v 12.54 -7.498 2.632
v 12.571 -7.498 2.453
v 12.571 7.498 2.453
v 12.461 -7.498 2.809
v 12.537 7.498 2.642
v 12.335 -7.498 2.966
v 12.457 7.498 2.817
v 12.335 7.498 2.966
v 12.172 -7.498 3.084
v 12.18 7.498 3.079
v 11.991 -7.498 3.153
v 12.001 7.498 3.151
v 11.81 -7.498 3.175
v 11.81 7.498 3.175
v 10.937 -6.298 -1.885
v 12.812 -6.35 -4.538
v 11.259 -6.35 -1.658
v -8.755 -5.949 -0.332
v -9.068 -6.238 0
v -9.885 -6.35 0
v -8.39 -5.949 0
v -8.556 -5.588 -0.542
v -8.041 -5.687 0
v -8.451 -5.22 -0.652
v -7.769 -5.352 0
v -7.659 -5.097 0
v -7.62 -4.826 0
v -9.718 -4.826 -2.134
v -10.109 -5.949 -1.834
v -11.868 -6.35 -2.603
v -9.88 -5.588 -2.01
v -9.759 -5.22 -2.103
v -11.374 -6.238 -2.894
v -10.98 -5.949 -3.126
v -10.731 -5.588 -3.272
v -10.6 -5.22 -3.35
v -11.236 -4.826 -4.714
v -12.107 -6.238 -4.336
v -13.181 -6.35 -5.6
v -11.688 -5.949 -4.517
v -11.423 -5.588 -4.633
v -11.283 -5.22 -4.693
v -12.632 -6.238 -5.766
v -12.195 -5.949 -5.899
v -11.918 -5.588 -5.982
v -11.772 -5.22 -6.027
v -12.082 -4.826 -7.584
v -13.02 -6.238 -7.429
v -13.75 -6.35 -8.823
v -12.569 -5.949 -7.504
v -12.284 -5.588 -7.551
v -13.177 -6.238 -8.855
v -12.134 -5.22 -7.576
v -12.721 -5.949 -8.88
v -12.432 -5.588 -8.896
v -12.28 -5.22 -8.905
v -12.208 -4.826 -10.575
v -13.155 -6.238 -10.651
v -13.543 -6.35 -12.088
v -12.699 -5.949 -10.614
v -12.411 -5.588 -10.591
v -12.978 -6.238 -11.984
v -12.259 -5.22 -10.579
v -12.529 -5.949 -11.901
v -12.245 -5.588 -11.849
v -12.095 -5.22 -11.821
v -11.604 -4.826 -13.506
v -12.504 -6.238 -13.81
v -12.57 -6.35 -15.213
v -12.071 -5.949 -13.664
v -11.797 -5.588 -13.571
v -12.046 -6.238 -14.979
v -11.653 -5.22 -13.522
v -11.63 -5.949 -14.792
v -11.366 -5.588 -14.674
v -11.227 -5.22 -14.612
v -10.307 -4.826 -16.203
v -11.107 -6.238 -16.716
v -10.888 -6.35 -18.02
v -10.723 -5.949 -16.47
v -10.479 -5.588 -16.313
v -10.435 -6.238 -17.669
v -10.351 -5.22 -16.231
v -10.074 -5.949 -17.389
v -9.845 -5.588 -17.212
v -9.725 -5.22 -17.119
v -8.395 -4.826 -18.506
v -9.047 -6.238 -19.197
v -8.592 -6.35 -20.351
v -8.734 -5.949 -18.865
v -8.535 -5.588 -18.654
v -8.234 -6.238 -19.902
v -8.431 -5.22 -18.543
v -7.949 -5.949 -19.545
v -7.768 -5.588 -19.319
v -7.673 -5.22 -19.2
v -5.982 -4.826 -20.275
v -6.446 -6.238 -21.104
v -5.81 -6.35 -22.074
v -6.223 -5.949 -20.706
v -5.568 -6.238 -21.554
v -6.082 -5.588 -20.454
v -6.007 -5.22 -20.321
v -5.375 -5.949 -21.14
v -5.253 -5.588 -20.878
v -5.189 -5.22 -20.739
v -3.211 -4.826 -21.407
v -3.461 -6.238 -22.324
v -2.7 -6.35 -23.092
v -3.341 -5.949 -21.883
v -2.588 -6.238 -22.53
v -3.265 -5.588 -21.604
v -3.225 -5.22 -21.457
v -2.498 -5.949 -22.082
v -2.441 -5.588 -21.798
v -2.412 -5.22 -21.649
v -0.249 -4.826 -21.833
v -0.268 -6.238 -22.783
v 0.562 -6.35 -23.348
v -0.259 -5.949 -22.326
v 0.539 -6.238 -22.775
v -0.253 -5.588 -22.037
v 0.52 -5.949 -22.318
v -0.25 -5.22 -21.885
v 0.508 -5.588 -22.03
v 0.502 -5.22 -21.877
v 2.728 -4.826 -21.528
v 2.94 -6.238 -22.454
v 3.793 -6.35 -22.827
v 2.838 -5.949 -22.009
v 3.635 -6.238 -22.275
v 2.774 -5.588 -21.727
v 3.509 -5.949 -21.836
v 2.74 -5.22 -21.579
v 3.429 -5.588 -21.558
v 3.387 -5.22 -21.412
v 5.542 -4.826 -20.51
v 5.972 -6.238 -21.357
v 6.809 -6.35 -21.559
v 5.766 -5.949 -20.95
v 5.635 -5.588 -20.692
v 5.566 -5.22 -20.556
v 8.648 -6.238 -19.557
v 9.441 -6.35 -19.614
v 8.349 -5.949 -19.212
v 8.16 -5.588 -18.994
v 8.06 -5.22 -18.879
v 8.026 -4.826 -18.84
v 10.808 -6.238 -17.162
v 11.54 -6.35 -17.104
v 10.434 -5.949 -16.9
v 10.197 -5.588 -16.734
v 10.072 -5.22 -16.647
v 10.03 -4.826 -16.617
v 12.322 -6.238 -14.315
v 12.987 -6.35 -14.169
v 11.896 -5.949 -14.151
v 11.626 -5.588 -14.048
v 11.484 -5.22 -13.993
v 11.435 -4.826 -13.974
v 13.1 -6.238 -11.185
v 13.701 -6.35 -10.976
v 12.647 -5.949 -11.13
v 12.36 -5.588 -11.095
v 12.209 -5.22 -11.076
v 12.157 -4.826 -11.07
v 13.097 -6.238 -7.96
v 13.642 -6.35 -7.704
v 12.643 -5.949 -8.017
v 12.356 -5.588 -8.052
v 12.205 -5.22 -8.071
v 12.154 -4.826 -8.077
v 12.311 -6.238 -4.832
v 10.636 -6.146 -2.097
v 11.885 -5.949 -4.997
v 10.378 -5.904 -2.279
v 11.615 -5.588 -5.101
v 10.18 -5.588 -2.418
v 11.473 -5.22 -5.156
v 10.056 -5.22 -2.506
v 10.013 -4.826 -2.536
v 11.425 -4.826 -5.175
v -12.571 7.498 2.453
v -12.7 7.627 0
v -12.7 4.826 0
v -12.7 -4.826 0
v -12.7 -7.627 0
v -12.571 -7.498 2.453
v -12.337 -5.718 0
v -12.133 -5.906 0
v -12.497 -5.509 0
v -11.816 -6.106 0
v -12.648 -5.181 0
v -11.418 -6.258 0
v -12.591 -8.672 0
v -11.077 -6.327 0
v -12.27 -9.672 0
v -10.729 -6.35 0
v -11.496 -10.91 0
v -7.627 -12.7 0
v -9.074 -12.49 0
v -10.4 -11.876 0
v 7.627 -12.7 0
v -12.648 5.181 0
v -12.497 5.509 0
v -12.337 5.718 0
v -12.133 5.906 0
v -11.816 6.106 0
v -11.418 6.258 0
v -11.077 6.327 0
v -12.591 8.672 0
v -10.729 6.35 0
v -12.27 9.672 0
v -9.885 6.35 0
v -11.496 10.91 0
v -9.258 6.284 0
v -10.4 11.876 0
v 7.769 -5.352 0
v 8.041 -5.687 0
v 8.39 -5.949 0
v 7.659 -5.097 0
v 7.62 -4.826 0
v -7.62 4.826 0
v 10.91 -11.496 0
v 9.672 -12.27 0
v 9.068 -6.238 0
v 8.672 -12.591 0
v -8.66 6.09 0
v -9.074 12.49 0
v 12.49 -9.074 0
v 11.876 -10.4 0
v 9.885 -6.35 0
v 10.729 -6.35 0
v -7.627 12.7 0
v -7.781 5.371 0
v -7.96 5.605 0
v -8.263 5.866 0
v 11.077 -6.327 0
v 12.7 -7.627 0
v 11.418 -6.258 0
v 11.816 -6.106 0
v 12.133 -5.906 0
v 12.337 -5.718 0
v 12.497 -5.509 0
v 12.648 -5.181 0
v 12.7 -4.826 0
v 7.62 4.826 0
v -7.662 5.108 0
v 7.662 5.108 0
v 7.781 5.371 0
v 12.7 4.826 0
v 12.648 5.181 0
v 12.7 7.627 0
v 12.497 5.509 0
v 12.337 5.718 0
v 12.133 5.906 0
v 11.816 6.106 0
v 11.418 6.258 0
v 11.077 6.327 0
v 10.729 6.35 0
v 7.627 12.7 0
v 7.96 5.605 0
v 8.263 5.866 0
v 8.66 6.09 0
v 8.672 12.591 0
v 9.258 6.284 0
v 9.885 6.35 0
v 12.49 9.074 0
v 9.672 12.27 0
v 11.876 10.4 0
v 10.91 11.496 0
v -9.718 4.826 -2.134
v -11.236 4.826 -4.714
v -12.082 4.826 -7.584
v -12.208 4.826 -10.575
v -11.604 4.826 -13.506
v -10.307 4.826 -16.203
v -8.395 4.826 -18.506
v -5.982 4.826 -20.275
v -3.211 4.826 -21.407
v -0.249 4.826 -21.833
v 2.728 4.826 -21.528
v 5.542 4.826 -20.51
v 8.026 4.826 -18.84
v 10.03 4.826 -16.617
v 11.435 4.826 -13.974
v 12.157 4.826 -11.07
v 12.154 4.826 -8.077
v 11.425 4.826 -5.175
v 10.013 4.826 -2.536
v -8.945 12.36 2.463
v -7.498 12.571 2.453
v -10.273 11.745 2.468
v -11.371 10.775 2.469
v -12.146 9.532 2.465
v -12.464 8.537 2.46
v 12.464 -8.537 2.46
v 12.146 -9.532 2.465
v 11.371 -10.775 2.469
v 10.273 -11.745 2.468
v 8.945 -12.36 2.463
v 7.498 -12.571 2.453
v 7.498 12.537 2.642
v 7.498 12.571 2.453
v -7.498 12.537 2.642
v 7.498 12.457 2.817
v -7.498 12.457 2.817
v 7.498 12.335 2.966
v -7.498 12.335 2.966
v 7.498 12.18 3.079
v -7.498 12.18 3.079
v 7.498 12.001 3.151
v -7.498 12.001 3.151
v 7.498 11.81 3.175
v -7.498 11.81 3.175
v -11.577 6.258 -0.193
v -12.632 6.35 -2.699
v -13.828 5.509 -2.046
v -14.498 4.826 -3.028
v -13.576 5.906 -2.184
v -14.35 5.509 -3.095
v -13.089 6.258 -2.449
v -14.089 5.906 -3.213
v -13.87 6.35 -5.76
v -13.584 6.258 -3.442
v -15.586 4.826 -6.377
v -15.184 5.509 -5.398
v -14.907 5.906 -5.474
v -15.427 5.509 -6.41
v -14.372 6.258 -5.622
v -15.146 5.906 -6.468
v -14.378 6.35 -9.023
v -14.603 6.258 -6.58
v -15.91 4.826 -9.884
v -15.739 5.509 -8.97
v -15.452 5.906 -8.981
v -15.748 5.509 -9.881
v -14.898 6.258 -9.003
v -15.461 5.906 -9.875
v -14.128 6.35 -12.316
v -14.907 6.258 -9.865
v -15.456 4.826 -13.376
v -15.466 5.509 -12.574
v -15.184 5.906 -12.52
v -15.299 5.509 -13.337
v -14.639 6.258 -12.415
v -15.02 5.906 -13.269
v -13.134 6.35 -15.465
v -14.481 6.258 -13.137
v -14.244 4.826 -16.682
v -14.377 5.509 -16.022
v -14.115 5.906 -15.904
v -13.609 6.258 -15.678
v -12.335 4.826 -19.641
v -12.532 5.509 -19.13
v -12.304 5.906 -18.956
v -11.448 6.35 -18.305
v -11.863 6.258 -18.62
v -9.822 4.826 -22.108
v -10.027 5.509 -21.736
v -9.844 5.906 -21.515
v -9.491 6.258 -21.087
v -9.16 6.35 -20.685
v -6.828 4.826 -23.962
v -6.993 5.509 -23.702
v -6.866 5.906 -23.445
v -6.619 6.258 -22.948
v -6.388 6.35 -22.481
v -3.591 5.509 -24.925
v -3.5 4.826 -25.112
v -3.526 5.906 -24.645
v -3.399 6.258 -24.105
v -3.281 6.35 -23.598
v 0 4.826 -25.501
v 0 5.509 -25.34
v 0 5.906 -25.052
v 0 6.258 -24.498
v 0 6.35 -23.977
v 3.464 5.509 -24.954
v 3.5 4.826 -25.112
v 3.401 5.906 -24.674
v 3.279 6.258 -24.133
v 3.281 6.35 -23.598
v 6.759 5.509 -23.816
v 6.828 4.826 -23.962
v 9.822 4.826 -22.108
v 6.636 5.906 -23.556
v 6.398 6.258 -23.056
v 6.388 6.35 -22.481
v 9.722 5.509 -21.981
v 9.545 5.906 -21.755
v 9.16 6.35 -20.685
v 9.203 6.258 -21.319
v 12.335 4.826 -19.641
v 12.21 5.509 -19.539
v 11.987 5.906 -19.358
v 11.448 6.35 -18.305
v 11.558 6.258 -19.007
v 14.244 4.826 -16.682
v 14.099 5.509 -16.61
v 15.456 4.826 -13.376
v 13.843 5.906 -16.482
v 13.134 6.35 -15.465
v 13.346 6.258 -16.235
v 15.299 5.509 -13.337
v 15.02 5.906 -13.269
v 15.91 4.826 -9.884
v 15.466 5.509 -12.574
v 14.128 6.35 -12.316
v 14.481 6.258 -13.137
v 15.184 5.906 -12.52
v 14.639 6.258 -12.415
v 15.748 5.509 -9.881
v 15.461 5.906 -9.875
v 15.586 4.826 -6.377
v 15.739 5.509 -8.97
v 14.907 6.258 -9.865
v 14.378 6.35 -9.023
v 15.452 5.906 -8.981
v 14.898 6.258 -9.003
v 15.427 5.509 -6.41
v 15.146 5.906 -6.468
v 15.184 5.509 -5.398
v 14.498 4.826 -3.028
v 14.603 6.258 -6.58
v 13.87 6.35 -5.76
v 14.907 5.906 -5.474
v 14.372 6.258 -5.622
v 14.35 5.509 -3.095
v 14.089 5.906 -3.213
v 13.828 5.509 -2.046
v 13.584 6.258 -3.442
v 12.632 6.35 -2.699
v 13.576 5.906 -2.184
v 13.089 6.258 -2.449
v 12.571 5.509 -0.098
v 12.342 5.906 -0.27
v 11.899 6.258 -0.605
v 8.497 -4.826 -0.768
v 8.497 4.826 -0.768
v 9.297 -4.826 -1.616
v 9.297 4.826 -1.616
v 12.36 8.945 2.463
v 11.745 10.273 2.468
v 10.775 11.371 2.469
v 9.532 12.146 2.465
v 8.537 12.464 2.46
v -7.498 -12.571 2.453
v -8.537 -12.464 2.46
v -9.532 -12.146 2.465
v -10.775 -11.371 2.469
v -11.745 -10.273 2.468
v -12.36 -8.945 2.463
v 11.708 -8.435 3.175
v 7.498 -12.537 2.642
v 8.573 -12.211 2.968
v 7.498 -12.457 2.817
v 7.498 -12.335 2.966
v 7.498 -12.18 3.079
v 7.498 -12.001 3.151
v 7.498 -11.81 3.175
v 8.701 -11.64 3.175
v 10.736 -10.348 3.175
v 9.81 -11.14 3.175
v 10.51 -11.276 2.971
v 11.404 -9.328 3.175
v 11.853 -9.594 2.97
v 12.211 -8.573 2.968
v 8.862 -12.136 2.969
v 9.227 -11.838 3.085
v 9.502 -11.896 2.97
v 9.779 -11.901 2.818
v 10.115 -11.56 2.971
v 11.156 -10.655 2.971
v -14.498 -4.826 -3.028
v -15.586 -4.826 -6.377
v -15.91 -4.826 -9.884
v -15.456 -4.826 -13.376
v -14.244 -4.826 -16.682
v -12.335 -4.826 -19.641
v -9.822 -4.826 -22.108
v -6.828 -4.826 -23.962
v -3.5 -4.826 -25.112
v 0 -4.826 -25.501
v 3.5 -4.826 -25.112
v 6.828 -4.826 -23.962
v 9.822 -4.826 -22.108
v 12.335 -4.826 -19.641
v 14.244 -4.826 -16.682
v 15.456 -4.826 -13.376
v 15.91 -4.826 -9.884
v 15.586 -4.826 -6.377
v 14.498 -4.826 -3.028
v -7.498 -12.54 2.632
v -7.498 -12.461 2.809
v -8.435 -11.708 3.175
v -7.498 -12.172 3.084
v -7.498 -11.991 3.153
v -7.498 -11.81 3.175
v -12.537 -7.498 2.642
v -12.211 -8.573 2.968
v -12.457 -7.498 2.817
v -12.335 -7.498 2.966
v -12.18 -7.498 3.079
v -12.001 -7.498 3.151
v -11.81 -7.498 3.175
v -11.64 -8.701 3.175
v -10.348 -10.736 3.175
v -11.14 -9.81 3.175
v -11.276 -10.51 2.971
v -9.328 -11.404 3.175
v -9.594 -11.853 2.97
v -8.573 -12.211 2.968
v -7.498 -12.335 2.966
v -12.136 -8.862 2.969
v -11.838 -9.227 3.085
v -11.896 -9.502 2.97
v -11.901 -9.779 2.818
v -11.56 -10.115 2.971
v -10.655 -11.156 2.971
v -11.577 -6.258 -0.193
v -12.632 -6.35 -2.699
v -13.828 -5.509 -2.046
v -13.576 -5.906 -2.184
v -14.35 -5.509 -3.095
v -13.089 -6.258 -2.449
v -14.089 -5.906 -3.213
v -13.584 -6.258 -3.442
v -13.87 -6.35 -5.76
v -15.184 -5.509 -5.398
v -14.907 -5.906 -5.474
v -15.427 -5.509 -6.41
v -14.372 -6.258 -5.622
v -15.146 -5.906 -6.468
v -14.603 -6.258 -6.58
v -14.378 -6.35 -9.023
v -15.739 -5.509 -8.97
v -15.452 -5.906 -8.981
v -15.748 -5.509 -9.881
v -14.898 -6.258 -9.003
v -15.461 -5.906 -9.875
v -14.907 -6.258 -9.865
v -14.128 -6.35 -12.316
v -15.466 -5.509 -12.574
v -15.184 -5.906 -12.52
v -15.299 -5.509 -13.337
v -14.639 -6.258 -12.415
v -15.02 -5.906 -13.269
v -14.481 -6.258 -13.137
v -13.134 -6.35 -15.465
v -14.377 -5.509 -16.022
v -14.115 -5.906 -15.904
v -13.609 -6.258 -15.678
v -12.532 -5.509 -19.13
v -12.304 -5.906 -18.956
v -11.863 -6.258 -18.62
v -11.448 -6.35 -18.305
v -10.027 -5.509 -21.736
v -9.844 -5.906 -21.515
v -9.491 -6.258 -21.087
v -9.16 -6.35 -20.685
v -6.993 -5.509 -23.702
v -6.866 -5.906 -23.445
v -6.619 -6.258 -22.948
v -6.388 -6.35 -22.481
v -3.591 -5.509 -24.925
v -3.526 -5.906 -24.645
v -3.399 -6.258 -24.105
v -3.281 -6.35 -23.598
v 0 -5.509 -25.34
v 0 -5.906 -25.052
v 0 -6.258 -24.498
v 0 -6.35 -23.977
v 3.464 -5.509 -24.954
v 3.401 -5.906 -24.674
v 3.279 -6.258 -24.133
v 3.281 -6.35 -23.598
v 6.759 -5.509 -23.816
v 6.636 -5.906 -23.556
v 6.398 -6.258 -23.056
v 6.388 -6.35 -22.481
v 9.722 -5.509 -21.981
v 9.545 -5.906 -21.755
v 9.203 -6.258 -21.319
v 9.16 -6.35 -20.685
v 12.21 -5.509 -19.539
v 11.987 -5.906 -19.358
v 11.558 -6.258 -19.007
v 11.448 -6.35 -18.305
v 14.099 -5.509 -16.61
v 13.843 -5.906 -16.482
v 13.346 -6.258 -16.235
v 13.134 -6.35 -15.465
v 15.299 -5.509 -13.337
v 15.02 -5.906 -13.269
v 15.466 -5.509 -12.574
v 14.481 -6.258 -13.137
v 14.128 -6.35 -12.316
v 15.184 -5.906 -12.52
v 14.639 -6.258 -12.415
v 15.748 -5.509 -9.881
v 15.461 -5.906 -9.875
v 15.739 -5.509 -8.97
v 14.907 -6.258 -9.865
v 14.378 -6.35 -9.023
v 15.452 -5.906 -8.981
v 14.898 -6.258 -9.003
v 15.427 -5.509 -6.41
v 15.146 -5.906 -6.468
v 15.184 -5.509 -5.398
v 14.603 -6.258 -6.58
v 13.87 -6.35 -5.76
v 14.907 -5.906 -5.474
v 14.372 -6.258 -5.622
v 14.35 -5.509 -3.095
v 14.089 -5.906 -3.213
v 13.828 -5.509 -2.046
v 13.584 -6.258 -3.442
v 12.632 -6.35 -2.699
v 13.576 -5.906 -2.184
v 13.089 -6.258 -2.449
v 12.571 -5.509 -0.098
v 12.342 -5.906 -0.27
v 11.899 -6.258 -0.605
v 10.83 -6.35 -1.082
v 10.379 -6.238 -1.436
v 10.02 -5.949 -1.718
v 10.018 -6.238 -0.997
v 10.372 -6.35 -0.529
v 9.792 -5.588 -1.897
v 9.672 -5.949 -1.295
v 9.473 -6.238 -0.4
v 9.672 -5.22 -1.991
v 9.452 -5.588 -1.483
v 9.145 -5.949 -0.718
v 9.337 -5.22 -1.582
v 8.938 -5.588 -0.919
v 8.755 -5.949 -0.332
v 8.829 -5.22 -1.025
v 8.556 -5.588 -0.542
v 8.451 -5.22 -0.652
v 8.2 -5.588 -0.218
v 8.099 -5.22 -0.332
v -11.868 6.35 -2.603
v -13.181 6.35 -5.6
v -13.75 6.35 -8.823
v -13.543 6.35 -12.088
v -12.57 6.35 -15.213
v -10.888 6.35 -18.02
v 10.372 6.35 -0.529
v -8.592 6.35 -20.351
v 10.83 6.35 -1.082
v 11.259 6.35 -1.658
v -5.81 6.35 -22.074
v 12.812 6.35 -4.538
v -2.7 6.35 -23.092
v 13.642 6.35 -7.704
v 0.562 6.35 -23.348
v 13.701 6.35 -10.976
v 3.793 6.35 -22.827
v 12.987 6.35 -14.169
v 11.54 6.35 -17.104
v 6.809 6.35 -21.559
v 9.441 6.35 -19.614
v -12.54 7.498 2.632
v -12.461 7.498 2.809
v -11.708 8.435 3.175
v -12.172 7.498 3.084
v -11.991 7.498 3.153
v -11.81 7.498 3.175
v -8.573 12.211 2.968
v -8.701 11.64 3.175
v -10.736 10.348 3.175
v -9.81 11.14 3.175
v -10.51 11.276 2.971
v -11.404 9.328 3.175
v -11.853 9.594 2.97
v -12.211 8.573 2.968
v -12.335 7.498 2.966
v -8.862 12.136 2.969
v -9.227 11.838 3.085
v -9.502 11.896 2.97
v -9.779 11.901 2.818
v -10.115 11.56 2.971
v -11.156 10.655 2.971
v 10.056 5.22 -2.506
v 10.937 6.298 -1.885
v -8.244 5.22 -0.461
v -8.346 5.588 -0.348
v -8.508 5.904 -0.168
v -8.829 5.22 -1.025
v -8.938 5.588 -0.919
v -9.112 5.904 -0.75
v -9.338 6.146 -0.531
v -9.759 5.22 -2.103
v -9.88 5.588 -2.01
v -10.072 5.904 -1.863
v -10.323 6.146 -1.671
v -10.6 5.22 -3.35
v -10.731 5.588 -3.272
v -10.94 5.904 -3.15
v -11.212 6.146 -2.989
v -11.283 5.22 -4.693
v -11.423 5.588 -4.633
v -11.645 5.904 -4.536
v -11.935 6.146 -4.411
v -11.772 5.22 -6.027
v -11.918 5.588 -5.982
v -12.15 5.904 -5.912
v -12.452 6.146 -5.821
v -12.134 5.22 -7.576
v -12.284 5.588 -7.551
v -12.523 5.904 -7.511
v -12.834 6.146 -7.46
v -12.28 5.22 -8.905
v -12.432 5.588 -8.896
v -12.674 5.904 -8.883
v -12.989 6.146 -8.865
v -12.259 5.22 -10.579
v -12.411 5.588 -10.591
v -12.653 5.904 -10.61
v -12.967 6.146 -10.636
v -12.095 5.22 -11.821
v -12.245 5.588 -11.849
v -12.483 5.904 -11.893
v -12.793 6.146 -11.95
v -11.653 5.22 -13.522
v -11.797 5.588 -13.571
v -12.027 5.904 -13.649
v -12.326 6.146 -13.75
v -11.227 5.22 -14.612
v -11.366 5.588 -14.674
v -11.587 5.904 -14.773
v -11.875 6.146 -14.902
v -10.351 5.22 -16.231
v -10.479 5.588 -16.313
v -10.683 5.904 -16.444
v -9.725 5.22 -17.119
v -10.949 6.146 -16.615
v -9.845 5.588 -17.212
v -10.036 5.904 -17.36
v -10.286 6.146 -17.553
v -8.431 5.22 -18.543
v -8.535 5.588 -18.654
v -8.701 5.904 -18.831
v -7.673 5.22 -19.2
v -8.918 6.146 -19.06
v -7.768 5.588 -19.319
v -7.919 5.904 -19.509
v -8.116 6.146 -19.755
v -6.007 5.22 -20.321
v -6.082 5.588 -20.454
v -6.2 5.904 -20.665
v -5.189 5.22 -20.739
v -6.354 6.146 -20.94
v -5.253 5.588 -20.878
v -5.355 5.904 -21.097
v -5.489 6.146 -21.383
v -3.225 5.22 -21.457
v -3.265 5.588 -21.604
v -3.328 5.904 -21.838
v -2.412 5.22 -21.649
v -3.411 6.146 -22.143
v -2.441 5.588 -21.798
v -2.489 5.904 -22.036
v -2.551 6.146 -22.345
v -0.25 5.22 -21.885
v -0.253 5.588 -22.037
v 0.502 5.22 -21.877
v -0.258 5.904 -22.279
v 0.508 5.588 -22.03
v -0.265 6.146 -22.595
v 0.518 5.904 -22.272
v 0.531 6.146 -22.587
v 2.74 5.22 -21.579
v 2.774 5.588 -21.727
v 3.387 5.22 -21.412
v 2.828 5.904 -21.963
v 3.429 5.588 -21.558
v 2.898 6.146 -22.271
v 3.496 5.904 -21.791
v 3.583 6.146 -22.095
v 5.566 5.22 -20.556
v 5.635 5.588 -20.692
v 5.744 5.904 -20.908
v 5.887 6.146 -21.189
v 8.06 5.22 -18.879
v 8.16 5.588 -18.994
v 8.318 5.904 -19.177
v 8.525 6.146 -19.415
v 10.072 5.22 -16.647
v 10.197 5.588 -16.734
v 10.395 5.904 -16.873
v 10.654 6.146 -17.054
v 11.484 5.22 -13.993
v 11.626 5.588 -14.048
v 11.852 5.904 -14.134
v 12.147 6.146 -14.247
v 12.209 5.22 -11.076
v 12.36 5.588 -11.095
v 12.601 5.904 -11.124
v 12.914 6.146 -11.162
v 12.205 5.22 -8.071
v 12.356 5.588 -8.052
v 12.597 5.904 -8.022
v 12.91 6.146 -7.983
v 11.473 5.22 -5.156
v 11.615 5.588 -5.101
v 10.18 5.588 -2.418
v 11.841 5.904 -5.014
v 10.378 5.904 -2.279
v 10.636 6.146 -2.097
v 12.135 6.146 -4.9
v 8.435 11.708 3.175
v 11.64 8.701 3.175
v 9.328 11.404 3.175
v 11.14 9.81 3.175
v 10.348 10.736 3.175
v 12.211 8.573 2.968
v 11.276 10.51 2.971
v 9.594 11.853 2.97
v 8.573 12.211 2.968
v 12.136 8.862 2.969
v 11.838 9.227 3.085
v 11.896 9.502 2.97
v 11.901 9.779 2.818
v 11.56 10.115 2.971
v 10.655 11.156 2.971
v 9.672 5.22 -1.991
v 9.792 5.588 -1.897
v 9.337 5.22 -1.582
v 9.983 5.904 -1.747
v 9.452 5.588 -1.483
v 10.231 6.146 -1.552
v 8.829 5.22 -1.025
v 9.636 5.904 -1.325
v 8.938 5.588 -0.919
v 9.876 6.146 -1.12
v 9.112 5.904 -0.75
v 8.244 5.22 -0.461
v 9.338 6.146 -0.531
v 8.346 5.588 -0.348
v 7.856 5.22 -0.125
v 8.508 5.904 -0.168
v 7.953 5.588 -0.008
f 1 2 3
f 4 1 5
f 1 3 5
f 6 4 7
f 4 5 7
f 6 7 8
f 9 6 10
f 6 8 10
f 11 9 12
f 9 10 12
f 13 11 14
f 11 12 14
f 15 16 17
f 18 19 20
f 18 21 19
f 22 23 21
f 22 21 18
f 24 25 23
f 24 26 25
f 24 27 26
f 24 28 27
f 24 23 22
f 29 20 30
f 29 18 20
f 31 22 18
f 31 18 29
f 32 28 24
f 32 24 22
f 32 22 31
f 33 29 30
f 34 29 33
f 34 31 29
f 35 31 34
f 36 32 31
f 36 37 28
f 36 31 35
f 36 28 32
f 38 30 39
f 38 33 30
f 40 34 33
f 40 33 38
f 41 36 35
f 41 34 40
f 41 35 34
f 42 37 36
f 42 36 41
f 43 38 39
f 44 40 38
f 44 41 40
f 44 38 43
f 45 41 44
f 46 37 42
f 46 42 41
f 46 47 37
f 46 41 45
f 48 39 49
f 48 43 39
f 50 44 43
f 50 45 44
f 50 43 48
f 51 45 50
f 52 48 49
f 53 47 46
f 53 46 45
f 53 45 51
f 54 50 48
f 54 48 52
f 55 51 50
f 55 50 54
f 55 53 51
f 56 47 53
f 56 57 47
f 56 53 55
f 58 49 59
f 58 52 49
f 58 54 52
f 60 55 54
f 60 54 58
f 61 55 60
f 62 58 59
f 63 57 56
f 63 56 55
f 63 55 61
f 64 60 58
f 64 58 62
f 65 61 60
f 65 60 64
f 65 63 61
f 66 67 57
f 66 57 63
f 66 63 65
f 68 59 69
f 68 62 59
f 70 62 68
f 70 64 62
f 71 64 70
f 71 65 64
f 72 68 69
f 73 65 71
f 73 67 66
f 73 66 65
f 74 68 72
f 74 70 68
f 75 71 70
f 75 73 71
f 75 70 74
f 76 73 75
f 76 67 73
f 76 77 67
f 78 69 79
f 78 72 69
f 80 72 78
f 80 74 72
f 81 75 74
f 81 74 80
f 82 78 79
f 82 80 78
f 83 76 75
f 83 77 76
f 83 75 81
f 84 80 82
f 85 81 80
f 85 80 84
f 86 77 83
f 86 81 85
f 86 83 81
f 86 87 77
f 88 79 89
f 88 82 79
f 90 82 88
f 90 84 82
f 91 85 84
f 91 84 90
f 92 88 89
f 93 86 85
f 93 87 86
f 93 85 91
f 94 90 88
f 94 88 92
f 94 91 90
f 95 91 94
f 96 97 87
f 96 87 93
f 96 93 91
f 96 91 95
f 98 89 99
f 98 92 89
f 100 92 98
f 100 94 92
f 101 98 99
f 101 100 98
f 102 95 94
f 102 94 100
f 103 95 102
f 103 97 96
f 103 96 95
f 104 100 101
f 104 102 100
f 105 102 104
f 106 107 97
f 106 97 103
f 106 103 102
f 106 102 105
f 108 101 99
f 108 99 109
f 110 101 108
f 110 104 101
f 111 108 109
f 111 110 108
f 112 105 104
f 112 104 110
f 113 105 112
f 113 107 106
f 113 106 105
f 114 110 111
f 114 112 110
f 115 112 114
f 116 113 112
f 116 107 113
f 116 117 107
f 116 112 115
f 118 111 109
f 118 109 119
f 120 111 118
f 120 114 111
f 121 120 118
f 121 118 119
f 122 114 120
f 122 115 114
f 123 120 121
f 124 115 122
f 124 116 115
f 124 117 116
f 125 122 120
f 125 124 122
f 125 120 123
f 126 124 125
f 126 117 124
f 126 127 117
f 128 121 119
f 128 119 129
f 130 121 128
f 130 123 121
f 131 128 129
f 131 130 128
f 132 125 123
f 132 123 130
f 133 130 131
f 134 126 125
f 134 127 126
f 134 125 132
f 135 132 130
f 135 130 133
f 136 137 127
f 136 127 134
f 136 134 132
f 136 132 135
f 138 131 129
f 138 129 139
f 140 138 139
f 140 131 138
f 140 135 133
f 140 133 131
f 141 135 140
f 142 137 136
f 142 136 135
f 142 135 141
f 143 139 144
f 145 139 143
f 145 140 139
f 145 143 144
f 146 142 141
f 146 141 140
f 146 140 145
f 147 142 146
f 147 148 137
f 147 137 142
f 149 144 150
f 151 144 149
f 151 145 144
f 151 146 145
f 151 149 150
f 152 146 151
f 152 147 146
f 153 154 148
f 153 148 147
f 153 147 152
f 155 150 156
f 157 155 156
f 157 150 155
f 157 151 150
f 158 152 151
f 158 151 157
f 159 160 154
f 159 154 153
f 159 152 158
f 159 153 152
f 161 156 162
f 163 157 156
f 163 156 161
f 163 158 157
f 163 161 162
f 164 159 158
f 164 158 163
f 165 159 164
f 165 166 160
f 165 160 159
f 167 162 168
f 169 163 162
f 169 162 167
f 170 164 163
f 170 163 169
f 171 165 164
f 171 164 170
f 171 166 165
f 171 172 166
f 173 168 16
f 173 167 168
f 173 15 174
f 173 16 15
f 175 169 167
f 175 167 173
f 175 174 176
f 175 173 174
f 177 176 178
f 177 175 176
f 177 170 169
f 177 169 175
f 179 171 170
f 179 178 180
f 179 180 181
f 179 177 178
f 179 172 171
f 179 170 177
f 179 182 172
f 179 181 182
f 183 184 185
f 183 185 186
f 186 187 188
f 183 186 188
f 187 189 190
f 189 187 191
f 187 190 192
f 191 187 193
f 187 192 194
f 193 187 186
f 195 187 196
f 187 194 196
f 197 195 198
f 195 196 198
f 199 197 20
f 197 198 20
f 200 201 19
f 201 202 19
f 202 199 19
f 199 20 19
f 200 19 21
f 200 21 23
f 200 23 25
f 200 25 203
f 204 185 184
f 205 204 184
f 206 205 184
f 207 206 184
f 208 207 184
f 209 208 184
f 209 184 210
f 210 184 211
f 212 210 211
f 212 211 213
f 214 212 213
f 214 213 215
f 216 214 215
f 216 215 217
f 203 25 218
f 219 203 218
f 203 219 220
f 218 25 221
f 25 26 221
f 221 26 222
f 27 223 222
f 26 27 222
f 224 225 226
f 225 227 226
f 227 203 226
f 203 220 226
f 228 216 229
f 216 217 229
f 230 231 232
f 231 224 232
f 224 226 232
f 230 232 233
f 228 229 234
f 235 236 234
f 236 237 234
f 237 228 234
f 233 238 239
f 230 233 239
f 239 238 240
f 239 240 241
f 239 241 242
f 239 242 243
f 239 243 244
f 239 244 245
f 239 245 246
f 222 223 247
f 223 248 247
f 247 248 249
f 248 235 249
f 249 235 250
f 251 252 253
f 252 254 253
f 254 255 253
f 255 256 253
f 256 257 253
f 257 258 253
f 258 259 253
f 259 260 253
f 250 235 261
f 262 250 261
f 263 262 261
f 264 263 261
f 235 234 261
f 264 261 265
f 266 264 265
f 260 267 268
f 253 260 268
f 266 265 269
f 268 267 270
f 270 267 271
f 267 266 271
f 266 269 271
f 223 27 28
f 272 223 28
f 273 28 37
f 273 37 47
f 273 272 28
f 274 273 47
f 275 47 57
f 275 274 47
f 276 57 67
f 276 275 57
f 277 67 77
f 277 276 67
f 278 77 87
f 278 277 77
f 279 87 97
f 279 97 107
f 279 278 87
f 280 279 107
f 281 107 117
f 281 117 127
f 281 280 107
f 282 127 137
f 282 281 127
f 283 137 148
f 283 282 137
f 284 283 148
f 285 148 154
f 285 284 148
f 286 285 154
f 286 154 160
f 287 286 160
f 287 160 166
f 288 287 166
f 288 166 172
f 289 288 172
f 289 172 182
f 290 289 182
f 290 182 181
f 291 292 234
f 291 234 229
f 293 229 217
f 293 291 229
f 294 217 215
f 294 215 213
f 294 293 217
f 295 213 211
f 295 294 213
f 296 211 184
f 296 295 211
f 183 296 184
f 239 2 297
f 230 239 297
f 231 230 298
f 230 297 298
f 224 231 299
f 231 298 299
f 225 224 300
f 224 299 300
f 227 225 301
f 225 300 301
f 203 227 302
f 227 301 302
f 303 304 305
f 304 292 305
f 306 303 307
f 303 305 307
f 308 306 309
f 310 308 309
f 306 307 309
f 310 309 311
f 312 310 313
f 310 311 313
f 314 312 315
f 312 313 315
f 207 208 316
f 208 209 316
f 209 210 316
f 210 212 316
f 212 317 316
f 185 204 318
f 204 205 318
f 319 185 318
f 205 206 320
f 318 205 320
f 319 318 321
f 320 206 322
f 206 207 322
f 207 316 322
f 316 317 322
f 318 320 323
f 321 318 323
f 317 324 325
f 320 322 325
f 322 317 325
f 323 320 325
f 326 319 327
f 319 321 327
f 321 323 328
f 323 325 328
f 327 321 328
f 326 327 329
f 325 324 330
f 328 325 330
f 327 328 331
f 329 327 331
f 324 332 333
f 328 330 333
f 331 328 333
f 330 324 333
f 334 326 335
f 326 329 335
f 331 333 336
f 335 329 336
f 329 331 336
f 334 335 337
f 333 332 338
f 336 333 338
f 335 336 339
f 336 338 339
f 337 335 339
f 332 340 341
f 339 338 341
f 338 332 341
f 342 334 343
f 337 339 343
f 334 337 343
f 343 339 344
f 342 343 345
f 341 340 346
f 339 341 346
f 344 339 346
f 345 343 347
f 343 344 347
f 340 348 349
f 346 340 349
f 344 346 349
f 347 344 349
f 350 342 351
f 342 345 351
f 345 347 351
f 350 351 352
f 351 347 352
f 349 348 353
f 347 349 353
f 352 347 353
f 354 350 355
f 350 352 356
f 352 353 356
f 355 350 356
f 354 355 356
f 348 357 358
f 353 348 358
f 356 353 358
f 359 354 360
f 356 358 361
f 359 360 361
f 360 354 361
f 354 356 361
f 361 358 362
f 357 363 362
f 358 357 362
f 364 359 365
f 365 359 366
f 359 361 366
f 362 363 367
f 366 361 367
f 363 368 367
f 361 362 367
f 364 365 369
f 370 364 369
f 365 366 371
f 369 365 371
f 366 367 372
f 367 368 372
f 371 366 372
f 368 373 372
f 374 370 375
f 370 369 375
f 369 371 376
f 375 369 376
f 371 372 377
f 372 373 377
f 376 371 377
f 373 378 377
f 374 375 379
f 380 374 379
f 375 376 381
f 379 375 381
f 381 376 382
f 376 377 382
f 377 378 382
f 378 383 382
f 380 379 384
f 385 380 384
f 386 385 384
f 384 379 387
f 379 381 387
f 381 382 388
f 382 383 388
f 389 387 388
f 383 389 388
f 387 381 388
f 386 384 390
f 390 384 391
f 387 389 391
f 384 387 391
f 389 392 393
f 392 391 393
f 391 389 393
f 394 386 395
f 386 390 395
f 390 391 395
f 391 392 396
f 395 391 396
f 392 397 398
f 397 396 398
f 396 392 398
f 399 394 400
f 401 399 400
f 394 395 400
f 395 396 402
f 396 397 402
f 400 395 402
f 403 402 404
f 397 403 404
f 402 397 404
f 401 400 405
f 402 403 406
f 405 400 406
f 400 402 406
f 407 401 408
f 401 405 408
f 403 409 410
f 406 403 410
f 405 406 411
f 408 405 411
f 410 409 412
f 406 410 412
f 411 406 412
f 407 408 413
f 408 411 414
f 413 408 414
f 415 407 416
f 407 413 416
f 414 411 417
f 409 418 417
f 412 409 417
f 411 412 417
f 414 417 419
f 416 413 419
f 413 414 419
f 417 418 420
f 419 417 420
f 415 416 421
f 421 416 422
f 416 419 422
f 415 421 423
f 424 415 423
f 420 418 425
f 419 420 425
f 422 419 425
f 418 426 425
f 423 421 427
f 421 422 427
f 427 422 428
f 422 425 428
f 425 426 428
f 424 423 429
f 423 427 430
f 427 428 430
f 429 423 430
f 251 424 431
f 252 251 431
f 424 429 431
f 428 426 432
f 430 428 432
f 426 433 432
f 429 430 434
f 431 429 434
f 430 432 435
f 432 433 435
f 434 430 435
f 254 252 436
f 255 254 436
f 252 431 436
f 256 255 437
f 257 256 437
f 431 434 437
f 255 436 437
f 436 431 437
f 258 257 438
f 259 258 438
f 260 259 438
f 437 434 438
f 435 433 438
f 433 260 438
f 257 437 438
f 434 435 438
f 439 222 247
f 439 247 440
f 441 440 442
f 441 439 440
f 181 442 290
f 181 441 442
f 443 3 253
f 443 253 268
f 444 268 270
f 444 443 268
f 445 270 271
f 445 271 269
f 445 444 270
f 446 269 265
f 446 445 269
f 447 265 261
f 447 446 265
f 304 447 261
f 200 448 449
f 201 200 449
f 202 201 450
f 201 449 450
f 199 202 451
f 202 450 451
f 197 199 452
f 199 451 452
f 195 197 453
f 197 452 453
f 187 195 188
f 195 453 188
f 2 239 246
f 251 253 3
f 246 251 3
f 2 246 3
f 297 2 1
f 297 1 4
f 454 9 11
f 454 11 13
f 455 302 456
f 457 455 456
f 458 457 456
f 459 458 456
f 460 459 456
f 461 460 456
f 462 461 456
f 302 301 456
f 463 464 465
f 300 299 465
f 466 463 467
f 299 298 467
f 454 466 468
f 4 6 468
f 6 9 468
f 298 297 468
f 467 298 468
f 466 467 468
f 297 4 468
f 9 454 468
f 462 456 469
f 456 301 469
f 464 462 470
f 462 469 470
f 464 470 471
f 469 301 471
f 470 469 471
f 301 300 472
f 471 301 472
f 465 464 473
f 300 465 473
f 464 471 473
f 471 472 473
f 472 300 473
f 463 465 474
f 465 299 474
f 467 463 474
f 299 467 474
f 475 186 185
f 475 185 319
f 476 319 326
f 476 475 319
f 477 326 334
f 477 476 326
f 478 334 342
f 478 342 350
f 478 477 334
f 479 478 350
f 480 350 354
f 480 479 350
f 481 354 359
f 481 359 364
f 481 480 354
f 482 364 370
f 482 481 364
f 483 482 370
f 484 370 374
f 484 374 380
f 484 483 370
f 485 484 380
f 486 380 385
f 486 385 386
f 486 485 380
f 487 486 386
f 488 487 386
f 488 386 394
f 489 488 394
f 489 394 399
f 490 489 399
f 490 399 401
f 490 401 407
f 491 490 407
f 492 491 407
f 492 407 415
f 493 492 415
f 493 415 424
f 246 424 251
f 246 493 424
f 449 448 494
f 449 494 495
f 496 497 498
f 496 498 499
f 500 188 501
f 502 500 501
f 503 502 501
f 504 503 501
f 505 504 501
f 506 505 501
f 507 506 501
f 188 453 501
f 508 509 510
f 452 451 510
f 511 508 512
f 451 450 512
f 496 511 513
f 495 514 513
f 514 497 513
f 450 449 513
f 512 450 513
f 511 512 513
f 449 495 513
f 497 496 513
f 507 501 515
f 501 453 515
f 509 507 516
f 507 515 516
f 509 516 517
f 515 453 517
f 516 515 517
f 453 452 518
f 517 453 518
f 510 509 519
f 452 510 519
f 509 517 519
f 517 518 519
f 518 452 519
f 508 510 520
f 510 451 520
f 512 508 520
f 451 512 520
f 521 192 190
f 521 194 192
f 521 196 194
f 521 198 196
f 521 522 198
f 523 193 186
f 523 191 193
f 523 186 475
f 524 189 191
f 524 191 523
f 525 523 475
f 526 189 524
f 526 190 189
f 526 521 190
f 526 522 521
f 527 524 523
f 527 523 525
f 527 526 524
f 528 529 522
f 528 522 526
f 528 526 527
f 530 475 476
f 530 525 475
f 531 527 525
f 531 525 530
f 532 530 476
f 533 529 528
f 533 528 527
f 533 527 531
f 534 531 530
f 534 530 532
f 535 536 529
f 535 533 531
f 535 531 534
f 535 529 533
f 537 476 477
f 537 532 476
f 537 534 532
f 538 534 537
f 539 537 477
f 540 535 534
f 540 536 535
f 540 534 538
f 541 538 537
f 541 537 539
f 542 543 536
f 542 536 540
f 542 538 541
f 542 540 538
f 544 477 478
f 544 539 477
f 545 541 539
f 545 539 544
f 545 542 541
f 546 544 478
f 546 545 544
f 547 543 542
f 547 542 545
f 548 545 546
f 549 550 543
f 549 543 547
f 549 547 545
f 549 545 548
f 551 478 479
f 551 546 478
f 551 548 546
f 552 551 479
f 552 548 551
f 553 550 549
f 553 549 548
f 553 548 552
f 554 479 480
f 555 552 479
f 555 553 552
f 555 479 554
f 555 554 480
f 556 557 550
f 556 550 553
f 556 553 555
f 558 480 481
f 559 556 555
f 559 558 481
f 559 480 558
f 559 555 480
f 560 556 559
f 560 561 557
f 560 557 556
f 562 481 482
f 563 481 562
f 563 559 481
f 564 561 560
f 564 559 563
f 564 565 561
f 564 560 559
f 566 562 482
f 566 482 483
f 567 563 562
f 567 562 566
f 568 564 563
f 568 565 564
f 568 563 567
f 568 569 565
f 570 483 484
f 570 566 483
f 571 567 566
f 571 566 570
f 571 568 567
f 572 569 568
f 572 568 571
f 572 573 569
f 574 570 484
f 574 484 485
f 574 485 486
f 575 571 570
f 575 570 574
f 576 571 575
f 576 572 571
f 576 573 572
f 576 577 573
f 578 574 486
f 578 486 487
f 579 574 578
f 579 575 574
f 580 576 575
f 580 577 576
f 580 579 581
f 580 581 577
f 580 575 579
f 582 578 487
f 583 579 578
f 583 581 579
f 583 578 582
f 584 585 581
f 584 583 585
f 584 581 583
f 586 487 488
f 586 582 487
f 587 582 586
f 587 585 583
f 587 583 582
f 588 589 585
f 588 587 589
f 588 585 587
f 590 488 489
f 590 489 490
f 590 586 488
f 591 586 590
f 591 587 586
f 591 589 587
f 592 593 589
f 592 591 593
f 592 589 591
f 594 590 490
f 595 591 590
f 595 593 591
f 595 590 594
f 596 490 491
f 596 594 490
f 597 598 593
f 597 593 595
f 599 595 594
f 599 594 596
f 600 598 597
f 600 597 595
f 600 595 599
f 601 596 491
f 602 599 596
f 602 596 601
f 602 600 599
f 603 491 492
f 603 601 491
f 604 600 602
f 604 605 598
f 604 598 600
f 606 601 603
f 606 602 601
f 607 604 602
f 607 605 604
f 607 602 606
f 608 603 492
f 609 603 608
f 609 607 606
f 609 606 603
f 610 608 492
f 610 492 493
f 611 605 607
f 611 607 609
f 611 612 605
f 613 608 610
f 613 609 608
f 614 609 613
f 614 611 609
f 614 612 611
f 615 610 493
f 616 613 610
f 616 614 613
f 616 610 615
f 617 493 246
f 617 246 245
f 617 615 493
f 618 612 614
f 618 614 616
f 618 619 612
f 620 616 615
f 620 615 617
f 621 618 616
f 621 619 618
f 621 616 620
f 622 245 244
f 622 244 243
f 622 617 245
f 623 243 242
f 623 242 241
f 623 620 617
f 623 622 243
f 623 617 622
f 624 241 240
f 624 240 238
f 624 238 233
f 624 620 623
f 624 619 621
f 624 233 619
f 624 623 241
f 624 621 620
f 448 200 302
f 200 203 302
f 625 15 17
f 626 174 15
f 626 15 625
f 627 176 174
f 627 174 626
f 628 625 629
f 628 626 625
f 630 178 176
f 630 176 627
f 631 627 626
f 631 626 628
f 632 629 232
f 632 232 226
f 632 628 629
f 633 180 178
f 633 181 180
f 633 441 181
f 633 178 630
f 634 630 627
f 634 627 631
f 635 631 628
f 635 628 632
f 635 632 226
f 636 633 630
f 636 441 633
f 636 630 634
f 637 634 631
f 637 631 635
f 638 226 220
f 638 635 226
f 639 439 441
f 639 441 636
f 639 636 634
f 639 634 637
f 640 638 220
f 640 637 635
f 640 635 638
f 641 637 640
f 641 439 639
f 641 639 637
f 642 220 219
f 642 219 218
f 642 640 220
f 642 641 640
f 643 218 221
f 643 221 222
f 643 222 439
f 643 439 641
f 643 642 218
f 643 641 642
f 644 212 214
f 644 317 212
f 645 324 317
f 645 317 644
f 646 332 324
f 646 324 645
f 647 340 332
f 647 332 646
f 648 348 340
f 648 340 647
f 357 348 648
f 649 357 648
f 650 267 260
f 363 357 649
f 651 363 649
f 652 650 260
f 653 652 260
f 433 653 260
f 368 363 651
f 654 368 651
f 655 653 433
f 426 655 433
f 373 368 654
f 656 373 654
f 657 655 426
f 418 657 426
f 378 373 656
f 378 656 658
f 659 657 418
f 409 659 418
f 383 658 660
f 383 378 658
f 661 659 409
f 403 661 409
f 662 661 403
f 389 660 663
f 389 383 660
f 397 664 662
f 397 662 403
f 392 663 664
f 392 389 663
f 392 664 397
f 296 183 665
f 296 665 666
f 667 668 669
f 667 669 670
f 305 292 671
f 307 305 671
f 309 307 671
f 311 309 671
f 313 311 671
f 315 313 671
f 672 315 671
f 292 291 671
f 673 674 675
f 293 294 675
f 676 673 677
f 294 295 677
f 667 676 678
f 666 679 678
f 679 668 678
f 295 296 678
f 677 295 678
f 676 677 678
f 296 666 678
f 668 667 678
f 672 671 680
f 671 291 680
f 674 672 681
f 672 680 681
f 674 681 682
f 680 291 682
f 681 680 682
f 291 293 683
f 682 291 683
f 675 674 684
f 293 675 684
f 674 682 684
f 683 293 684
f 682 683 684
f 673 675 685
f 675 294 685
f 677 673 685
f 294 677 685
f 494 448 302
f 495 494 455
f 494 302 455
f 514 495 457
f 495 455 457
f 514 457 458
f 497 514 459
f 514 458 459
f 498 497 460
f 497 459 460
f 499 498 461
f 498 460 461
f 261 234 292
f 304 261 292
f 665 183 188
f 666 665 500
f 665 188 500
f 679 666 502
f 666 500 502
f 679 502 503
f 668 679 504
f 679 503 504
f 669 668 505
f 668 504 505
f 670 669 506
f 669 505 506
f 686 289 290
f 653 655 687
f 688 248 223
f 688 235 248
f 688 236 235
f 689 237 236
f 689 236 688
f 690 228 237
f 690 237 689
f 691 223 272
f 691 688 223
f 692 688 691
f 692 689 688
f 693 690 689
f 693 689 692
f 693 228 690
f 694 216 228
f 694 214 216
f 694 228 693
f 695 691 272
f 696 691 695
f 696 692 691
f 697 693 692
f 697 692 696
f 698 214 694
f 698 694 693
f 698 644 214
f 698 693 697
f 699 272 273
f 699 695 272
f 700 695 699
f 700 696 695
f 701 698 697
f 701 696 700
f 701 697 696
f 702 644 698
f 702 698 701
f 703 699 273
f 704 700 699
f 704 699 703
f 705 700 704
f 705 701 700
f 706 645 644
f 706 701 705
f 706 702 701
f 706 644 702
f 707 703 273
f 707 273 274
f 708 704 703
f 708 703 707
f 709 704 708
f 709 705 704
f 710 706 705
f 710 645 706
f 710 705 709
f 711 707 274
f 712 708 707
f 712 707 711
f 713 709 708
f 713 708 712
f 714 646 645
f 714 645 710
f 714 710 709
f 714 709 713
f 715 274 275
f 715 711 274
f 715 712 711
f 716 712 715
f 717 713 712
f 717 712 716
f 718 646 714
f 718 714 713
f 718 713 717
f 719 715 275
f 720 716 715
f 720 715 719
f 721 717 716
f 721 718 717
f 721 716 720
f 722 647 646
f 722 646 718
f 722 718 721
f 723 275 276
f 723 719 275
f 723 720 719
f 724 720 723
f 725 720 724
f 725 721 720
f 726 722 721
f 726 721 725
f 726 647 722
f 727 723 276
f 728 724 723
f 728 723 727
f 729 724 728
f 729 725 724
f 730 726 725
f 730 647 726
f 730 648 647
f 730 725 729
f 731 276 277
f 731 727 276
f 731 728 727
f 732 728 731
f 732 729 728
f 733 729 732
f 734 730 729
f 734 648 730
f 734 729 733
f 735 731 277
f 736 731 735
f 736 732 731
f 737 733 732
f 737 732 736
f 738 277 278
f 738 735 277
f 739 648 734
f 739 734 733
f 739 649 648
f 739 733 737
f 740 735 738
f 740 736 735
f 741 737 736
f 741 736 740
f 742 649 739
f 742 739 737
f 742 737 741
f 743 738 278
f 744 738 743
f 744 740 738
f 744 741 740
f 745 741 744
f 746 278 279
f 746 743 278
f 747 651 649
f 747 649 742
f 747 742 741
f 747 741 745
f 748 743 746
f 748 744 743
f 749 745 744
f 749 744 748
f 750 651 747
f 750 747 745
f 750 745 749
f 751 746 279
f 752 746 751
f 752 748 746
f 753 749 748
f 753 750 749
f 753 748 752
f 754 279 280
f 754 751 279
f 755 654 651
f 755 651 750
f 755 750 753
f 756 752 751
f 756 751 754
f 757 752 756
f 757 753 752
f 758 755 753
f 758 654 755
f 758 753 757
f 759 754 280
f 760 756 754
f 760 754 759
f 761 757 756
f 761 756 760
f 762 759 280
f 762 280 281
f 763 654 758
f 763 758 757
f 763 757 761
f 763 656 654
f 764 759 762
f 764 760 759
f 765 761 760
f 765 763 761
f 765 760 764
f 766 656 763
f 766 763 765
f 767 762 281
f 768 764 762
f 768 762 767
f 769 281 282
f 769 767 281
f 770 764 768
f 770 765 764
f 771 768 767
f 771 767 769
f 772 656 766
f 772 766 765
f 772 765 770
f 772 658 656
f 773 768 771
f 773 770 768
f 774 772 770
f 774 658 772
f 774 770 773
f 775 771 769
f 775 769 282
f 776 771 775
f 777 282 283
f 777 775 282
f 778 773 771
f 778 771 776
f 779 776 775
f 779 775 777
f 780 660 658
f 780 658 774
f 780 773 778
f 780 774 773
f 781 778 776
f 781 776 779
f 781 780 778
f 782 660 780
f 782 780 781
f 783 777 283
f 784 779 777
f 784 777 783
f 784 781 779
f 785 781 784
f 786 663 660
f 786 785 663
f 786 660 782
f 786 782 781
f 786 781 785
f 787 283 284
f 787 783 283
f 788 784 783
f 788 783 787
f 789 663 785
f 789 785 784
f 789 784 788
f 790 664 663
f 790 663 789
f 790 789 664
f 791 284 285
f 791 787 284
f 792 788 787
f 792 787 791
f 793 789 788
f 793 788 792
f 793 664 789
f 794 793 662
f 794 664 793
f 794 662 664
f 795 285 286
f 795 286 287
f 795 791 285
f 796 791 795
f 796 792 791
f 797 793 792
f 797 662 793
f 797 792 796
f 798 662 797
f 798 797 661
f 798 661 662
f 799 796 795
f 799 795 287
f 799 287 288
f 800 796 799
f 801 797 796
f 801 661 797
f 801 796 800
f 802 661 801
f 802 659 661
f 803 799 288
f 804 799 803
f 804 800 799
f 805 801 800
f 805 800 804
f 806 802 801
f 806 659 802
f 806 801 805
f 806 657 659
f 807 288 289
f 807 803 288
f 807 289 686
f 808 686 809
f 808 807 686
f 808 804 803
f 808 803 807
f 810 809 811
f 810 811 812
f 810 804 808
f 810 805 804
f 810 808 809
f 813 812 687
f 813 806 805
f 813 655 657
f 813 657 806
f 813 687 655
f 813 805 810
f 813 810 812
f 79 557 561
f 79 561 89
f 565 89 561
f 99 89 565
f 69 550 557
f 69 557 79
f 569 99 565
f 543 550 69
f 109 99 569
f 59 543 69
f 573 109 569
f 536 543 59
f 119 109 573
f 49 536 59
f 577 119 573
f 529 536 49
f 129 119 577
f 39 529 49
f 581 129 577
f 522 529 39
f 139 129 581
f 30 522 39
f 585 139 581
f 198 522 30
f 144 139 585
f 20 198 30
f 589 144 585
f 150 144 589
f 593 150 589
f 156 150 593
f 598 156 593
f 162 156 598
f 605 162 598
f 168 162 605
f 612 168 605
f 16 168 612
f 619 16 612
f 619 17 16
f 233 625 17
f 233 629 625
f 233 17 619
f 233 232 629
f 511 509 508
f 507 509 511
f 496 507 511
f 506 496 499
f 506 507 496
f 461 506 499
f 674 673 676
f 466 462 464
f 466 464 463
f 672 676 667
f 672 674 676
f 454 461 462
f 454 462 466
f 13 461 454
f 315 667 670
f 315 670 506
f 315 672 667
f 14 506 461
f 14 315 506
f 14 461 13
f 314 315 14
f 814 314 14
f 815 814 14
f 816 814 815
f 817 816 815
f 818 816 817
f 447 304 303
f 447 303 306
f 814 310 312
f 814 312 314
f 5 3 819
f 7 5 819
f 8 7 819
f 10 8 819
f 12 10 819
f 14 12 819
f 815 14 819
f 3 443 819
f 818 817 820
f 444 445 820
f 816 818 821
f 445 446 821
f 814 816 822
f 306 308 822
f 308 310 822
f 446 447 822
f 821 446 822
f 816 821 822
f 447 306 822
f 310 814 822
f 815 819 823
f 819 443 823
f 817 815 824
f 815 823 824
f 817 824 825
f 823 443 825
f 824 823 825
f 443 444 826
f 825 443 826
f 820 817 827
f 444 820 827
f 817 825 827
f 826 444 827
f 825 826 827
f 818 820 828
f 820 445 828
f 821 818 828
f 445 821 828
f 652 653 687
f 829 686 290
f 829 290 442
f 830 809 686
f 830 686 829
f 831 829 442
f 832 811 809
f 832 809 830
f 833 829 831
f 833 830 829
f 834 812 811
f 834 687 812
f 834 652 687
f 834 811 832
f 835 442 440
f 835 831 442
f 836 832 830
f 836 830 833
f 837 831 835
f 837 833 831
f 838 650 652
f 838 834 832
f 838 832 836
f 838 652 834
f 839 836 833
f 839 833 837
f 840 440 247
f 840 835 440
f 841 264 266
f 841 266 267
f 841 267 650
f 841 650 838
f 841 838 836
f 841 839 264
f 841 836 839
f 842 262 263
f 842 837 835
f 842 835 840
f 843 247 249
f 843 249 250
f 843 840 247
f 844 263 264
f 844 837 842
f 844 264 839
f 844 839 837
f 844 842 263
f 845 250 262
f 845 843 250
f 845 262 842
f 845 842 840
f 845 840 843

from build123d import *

# Parameters (mm, degrees)
F0_W     = 25.4
F0_H     = 25.4
F1_DEPTH = 3.175
F1_TAPER = 3
F3_W     = 5.08
F3_H     = 6.35
F6_DEPTH = 12.7
F7_R     = 5.08
F8_R     = 1.524
F9_R     = 0.762


with BuildPart() as f1:
    # F0 (on Top) → F1 (new body)
    with BuildSketch(Plane.XY):
        Rectangle(F0_W, F0_H)
    extrude(amount=F1_DEPTH, taper=F1_TAPER)

    # F4: sweep along a path in F2
    with BuildLine(Plane.XZ) as f4_path:
        ThreePointArc((-10.16, 0), (0, -23.5582897328), (10.16, 0))
    # F3 (on Top) → F4 (sweep)
    with BuildSketch(Plane.XY):
        with Locations((-10.16, -3.175)):
            Rectangle(F3_W, F3_H)
        with Locations((-10.16, 3.175)):
            Rectangle(F3_W, F3_H)
    sweep(path=f4_path.line)

    # F5 (on face) → F6 (join, through all)
    with BuildSketch(Plane.XZ.offset(6.35)):
        with BuildLine():
            ThreePointArc((10.0130578512, -2.535746045), (-1.743325406, -21.7110170055), (-7.62, 0))
            Line((-7.62, 0), (-12.7, 0))
            ThreePointArc((-12.7, 0), (0, -25.5013441222), (12.7, 0))
            Line((12.7, 0), (10.16, 0))
            Line((10.16, 0), (10.0130578512, -2.535746045))
        make_face()
        with BuildLine():
            ThreePointArc((7.62, 0), (8.9072265211, -1.1822790439), (10.0130578512, -2.535746045))
            Line((10.0130578512, -2.535746045), (10.16, 0))
            Line((10.16, 0), (7.62, 0))
        make_face()
    extrude(amount=-F6_DEPTH)

    # F7
    f7_edges = [f1.edges().sort_by_distance(p)[0] for p in [
        (12.616803, 12.616803, 1.5875),
        (-12.616803, 12.616803, 1.5875),
        (12.616803, -12.616803, 1.5875),
        (-12.616803, -12.616803, 1.5875),
    ]]
    fillet(f7_edges, radius=F7_R)

    # F8
    f8_edges = [f1.edges().sort_by_distance(p)[0] for p in [
        (0, -6.35, -21.835726),
        (0, -6.35, -25.501344),
        (0, 6.35, -25.501344),
        (0, 6.35, -21.835726),
    ]]
    fillet(f8_edges, radius=F8_R)

    # F9
    f9_edges = [f1.edges().sort_by_distance(p)[0] for p in [
        (0, 12.533605, 3.175),
        (11.048589, 11.048589, 3.175),
        (-11.048589, 11.048589, 3.175),
        (12.533605, 0, 3.175),
        (-12.533605, 0, 3.175),
        (11.048589, -11.048589, 3.175),
        (-11.048589, -11.048589, 3.175),
        (0, -12.533605, 3.175),
    ]]
    fillet(f9_edges, radius=F9_R)


solid = f1.part
